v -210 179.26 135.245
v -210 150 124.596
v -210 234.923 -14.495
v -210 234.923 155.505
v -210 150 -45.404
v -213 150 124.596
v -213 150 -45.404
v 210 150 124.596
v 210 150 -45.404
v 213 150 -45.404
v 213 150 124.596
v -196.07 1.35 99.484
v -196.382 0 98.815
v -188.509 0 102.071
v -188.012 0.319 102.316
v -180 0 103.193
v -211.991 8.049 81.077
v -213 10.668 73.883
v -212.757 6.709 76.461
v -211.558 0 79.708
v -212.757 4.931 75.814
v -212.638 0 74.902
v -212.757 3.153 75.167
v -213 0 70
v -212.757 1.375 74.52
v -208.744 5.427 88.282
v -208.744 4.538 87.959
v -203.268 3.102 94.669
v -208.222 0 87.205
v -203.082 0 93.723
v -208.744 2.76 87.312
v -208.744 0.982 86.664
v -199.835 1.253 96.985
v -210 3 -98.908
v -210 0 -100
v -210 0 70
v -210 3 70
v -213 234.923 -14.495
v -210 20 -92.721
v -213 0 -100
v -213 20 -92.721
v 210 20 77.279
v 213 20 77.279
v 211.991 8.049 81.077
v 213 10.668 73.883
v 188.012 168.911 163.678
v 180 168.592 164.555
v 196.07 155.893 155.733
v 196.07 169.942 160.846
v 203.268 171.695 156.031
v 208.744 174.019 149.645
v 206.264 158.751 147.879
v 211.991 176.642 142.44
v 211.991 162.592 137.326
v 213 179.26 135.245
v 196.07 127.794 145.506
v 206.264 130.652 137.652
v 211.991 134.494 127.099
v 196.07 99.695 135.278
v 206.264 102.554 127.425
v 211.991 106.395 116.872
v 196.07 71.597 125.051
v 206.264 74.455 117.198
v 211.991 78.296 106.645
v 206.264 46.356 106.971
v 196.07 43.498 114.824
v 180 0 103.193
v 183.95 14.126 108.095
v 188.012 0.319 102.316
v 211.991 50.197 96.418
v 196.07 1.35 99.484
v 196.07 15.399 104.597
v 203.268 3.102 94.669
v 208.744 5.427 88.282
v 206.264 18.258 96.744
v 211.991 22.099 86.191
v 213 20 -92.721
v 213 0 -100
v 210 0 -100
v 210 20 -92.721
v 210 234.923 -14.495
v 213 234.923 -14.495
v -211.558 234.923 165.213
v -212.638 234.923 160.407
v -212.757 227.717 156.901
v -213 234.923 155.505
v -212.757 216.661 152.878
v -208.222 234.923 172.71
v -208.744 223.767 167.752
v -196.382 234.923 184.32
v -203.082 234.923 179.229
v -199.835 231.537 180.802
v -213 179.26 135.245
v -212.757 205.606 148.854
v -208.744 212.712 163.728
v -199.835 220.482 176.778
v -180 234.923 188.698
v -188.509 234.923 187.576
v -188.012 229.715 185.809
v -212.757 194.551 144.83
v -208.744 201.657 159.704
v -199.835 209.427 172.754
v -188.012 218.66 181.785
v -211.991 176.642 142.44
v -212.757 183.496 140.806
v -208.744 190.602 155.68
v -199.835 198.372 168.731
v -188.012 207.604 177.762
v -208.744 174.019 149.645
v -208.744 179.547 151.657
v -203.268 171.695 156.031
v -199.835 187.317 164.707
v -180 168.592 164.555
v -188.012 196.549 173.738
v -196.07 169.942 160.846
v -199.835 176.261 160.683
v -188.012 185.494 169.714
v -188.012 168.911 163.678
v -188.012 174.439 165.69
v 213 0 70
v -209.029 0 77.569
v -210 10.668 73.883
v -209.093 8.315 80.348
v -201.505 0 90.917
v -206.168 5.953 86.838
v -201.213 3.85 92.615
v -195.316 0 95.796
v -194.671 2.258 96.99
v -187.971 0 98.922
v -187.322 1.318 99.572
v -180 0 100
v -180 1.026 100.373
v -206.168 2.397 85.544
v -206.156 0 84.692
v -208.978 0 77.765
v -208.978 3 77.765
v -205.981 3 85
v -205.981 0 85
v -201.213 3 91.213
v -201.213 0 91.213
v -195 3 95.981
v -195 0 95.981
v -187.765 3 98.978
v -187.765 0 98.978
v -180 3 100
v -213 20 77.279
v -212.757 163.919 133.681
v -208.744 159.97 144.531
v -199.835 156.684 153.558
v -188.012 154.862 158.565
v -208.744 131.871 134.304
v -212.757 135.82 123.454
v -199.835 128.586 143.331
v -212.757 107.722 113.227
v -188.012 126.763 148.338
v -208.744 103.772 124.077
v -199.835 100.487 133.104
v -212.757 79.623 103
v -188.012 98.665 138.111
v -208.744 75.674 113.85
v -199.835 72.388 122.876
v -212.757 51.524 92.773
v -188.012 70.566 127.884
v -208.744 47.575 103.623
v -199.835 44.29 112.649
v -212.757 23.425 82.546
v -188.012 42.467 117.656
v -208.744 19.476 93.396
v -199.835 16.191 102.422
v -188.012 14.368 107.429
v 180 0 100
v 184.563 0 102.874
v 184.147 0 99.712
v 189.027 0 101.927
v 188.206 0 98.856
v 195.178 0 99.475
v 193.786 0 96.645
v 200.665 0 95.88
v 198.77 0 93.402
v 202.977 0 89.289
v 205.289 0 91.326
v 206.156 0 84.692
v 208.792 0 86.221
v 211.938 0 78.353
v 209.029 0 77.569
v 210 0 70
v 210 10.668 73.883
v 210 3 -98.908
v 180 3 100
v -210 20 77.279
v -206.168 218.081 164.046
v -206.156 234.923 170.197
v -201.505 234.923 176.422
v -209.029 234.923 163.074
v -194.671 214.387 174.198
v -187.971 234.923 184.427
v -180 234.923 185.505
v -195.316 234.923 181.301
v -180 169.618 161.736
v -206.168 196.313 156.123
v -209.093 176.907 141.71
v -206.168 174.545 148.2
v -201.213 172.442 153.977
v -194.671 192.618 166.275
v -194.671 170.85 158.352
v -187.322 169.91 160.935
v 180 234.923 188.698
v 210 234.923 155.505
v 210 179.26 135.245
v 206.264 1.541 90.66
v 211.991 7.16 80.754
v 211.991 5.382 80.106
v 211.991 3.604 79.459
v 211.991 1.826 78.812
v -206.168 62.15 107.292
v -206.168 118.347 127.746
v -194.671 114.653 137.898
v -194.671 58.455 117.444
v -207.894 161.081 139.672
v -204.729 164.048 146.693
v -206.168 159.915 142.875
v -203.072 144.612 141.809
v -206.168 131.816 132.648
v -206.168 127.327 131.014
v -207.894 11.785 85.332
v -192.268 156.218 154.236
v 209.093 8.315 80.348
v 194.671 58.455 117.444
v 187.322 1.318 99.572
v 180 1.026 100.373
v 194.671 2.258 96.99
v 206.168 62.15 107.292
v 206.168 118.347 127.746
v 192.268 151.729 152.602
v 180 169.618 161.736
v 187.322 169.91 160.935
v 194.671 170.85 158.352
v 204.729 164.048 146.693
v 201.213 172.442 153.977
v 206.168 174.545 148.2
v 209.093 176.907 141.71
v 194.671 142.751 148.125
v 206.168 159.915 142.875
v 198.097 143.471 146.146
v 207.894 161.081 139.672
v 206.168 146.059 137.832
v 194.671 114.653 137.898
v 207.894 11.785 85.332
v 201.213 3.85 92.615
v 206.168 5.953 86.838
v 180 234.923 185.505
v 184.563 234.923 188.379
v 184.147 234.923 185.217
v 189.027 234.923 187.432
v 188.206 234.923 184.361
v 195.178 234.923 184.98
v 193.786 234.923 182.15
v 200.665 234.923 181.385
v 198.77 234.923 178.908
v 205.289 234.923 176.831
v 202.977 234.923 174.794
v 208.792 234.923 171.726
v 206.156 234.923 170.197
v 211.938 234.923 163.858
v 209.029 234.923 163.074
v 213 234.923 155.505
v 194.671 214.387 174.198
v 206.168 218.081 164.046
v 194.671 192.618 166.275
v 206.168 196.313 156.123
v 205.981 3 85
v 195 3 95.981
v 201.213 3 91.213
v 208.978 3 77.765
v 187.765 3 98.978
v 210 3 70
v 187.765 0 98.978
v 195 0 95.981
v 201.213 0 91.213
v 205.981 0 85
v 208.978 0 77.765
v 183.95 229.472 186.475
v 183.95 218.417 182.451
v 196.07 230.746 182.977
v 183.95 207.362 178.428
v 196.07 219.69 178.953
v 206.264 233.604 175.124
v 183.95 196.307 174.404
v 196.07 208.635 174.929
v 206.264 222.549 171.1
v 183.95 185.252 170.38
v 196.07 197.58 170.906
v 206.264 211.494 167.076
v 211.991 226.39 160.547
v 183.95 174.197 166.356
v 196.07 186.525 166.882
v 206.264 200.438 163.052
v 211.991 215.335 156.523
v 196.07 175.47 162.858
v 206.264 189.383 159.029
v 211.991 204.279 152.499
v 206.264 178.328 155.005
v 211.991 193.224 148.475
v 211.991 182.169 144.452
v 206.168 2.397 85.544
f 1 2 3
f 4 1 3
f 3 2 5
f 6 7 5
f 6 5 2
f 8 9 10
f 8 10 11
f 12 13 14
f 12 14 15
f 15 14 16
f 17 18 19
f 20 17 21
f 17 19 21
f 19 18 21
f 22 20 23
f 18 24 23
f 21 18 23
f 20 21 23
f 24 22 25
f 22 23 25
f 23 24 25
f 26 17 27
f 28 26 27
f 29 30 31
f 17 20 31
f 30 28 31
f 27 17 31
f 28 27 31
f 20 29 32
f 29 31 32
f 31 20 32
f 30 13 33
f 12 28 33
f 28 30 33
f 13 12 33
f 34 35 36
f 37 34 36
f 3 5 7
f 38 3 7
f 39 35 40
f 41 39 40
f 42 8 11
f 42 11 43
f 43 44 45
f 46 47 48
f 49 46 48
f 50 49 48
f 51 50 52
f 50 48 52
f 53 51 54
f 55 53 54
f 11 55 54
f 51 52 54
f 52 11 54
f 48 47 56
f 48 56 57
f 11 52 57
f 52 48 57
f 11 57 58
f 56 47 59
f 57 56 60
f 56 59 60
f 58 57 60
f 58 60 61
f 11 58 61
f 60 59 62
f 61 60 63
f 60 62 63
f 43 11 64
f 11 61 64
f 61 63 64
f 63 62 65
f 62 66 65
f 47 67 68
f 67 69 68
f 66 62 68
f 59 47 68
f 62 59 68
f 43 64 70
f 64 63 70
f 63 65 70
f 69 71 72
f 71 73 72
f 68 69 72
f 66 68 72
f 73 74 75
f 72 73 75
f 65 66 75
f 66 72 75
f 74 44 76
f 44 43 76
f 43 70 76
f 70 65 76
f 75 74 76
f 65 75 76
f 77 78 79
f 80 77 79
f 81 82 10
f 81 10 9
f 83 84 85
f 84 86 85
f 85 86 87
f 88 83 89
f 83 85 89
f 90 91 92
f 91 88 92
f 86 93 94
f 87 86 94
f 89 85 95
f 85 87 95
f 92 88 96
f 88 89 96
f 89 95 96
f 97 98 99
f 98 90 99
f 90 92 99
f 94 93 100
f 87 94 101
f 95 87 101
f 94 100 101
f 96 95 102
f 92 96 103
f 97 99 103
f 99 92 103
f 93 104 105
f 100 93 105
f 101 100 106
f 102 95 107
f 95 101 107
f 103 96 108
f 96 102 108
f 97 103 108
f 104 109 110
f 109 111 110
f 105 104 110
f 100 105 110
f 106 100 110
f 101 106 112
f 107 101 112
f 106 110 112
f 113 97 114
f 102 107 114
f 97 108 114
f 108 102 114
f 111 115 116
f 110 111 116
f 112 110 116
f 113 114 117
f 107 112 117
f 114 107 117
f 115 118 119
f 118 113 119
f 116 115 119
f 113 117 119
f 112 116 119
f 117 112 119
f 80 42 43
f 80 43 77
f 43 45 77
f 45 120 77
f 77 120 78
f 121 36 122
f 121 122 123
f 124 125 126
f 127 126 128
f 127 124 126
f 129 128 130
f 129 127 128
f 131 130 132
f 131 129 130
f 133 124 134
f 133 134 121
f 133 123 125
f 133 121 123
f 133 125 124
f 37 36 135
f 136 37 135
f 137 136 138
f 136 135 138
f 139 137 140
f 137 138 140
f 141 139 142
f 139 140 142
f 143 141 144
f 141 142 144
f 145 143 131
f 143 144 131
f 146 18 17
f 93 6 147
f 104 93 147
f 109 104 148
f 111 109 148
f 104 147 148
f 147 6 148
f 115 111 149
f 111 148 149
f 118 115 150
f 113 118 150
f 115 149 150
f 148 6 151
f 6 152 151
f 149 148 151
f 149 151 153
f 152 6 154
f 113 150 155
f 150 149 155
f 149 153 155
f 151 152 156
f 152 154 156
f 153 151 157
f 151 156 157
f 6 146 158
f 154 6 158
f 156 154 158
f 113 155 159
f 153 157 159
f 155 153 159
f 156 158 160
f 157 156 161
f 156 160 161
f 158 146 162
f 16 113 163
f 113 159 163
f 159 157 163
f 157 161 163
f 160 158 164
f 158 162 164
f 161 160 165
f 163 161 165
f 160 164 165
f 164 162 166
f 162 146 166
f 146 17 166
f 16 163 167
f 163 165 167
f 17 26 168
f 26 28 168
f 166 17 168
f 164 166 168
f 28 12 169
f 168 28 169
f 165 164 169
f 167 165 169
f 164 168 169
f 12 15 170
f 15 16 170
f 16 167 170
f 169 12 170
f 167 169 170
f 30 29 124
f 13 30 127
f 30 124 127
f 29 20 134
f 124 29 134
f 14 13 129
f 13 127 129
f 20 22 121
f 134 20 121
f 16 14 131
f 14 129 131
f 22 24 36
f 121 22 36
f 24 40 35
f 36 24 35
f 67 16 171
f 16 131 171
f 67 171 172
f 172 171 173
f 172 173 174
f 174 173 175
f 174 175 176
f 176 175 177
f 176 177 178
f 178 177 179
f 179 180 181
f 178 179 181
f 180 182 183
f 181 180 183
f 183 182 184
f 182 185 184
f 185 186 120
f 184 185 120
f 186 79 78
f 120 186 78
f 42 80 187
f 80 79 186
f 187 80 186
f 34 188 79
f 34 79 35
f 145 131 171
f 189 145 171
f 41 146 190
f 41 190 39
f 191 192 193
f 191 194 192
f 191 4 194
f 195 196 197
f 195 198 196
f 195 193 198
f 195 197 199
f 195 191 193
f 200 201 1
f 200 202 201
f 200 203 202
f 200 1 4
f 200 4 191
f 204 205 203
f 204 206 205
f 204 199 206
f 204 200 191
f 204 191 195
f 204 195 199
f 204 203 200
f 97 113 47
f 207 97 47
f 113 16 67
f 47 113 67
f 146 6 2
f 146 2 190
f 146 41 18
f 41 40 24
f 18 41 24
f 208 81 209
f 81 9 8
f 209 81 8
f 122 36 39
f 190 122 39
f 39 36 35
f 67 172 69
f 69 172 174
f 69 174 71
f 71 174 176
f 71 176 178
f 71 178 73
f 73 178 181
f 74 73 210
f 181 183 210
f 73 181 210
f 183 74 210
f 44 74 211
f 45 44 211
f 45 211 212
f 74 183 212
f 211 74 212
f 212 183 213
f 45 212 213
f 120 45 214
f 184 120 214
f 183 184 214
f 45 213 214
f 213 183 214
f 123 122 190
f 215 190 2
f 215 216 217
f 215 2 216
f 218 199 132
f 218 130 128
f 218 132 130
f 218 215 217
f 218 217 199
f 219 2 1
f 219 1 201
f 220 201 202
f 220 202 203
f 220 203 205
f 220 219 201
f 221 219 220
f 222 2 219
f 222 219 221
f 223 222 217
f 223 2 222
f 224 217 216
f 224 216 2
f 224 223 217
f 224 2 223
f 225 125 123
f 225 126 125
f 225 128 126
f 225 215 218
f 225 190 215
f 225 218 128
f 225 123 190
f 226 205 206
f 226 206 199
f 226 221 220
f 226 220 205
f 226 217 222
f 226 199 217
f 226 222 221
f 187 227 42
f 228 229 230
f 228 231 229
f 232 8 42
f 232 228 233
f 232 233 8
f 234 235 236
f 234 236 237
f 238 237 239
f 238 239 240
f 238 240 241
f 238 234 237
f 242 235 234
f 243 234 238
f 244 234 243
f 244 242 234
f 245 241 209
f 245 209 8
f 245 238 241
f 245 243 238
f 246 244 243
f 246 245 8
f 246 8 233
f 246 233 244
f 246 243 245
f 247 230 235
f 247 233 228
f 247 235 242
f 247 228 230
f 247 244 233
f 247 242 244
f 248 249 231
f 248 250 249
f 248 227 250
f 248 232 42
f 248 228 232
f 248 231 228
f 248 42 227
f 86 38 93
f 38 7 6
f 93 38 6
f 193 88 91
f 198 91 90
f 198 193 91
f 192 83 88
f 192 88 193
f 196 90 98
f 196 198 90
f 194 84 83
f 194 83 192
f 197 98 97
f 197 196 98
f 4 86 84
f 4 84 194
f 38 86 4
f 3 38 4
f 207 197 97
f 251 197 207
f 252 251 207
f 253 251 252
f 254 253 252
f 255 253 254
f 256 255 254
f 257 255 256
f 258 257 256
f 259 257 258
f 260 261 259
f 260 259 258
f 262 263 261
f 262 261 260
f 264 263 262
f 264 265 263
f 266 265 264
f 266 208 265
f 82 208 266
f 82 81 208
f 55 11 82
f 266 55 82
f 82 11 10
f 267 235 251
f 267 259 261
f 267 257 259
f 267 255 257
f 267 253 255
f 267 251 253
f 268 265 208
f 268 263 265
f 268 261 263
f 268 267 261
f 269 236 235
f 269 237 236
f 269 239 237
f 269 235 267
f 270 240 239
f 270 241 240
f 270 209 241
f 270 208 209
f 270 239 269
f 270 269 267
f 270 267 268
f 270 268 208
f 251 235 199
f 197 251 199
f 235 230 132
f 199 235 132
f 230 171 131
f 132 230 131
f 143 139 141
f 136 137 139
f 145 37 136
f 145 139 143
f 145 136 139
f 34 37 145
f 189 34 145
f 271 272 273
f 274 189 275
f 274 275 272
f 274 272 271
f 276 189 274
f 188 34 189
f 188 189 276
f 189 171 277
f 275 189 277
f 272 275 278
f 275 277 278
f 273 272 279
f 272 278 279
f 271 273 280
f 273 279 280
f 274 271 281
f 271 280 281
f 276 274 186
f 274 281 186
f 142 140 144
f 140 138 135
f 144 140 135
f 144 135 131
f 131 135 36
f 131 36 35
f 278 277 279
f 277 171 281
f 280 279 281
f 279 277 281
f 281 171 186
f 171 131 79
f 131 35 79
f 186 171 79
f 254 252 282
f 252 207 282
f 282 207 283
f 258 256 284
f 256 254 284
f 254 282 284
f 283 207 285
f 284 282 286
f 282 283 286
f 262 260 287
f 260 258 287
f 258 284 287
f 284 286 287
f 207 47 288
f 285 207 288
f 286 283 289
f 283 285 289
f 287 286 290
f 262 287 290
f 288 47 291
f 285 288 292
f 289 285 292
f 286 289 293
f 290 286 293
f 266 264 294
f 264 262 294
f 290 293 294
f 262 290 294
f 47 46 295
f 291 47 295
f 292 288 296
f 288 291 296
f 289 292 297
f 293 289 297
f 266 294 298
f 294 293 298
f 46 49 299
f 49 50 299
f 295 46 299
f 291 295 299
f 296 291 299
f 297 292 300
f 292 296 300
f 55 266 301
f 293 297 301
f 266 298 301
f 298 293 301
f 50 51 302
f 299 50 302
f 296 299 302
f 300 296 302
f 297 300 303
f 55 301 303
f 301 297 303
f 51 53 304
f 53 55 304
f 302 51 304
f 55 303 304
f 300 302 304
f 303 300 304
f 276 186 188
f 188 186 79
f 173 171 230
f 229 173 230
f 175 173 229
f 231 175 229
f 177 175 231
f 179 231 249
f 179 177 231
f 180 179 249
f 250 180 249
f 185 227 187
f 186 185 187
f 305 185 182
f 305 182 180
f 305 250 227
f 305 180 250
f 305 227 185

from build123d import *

# Parameters (mm, degrees)
SWEEP_THIN1_START       = 35.293924935
SWEEP_THIN1_DEPTH       = 179.41214993
SWEEP_THIN1_START_2     = -35.293925135
SWEEP_THIN1_2_DEPTH     = 320.58785027
SWEEP_THIN1_START_3     = -67
SWEEP_THIN1_3_OUTLINE_W = 426
SWEEP_THIN1_3_OUTLINE_H = 295
SWEEP_THIN1_3_DEPTH     = 67
SWEEP_THIN1_START_4     = 234.923155196
SWEEP_THIN1_4_OUTLINE_W = 426
SWEEP_THIN1_4_OUTLINE_H = 295
SWEEP_THIN1_4_DEPTH     = 66.330881923
BOSS_EXTRUDE2_DEPTH     = 3
SKETCH6_W               = 723.00386444
SKETCH6_H               = 605.053805232
CUT_EXTRUDE1_DEPTH      = 3
CUT_EXTRUDE2_DEPTH      = 522.796571163


with BuildPart() as part:
    # Sweep-Thin1: read off the stored shape, not the designer's step
    # Sweep-Thin1 outline → Sweep-Thin1 (new body)
    with BuildSketch(Plane(origin=(0, 0, 0), x_dir=(1, 0, 0), z_dir=(0, 0.9396926207859089, 0.3420201433256673)).offset(SWEEP_THIN1_START)):
        with BuildLine():
            Line((213, -65.778483455), (213, 96.969262079))
            Line((213, 96.969262079), (-213, 96.969262079))
            Line((-213, 96.969262079), (-213, -65.778483455))
            add(Edge.make_bspline(
                [(-213, -65.778483455), (-213, -69.477042237), (-212.493972968, -73.37256542), (-211.393047263, -77.378729206), (-209.625765414, -81.371277703), (-207.160966169, -85.187590547), (-204.030117008, -88.644891062), (-200.35485162, -91.564481232), (-196.328004584, -93.851338413), (-192.135894004, -95.485342048), (-187.941508955, -96.501990369), (-183.867765418, -96.969262079), (-180, -96.969262079)],
                knots=[0, 0, 0, 0, 0, 0, 0, 0, 0, 0, 0, 0, 0, 1, 1, 1, 1, 1, 1, 1, 1, 1, 1, 1, 1, 1], degree=12))
            Line((-180, -96.969262079), (180, -96.969262079))
            add(Edge.make_bspline(
                [(180, -96.969262079), (183.867765418, -96.969262079), (187.941508955, -96.501990369), (192.135894005, -95.485342048), (196.328004584, -93.851338413), (200.35485162, -91.564481232), (204.030117008, -88.644891062), (207.16096617, -85.187590547), (209.625765413, -81.371277703), (211.393047263, -77.378729206), (212.493972968, -73.37256542), (213, -69.477042237), (213, -65.778483455)],
                knots=[0, 0, 0, 0, 0, 0, 0, 0, 0, 0, 0, 0, 0, 1, 1, 1, 1, 1, 1, 1, 1, 1, 1, 1, 1, 1], degree=12))
        make_face()
        with BuildLine():
            Line((-210, 93.969262079), (210, 93.969262079))
            Line((210, 93.969262079), (210, -65.778483455))
            add(Edge.make_bspline(
                [(180, -93.969262079), (197.573593129, -93.969262079), (210, -82.292259239), (210, -65.778483455)],
                knots=[0, 0, 0, 0, 1, 1, 1, 1], degree=3, weights=[1, 0.804737854, 0.804737854, 1]))
            Line((180, -93.969262079), (-180, -93.969262079))
            add(Edge.make_bspline(
                [(-210, -65.778483455), (-210, -82.292259239), (-197.573593129, -93.969262079), (-180, -93.969262079)],
                knots=[0, 0, 0, 0, 1, 1, 1, 1], degree=3, weights=[1, 0.804737854, 0.804737854, 1]))
            Line((-210, -65.778483455), (-210, 93.969262079))
        make_face(mode=Mode.SUBTRACT)
    extrude(amount=SWEEP_THIN1_DEPTH)

    # Sweep-Thin1 2 outline → Sweep-Thin1 2 (add)
    with BuildSketch(Plane(origin=(0, 0, 0), x_dir=(1, 0, 0), z_dir=(0, 0.9396926207859089, 0.3420201433256673)).offset(SWEEP_THIN1_START_2)):
        with BuildLine():
            Line((-213, 96.969262079), (-213, -65.778483455))
            add(Edge.make_bspline(
                [(-213, -65.778483455), (-213, -69.477042237), (-212.493972968, -73.37256542), (-211.393047263, -77.378729206), (-209.625765414, -81.371277703), (-207.160966169, -85.187590547), (-204.030117008, -88.644891062), (-200.35485162, -91.564481232), (-196.328004584, -93.851338413), (-192.135894004, -95.485342048), (-187.941508955, -96.501990369), (-183.867765418, -96.969262079), (-180, -96.969262079)],
                knots=[0, 0, 0, 0, 0, 0, 0, 0, 0, 0, 0, 0, 0, 1, 1, 1, 1, 1, 1, 1, 1, 1, 1, 1, 1, 1], degree=12))
            Line((-180, -96.969262079), (180, -96.969262079))
            add(Edge.make_bspline(
                [(180, -96.969262079), (183.867765418, -96.969262079), (187.941508955, -96.501990369), (192.135894005, -95.485342048), (196.328004584, -93.851338413), (200.35485162, -91.564481232), (204.030117008, -88.644891062), (207.16096617, -85.187590547), (209.625765413, -81.371277703), (211.393047263, -77.378729206), (212.493972968, -73.37256542), (213, -69.477042237), (213, -65.778483455)],
                knots=[0, 0, 0, 0, 0, 0, 0, 0, 0, 0, 0, 0, 0, 1, 1, 1, 1, 1, 1, 1, 1, 1, 1, 1, 1, 1], degree=12))
            Line((213, -65.778483455), (213, 96.969262079))
            Line((213, 96.969262079), (-213, 96.969262079))
        make_face()
        with BuildLine():
            add(Edge.make_bspline(
                [(-210, -65.778483455), (-210, -82.292259239), (-197.573593129, -93.969262079), (-180, -93.969262079)],
                knots=[0, 0, 0, 0, 1, 1, 1, 1], degree=3, weights=[1, 0.804737854, 0.804737854, 1]))
            Line((-210, -65.778483455), (-210, 93.969262079))
            Line((-210, 93.969262079), (210, 93.969262079))
            Line((210, 93.969262079), (210, -65.778483455))
            add(Edge.make_bspline(
                [(180, -93.969262079), (197.573593129, -93.969262079), (210, -82.292259239), (210, -65.778483455)],
                knots=[0, 0, 0, 0, 1, 1, 1, 1], degree=3, weights=[1, 0.804737854, 0.804737854, 1]))
            Line((180, -93.969262079), (-180, -93.969262079))
        make_face(mode=Mode.SUBTRACT)
    extrude(amount=SWEEP_THIN1_2_DEPTH)

    # Sweep-Thin1 3 outline → Sweep-Thin1 3 (cut)
    with BuildSketch(Plane(origin=(0, 0, 0), x_dir=(1, 0, 0), z_dir=(0, 1, 0)).offset(SWEEP_THIN1_START_3)):
        with Locations((0, -42.5)):
            Rectangle(SWEEP_THIN1_3_OUTLINE_W, SWEEP_THIN1_3_OUTLINE_H)
    extrude(amount=SWEEP_THIN1_3_DEPTH, mode=Mode.SUBTRACT)

    # Sweep-Thin1 4 outline → Sweep-Thin1 4 (cut)
    with BuildSketch(Plane(origin=(0, 0, 0), x_dir=(1, 0, 0), z_dir=(0, 1, 0)).offset(SWEEP_THIN1_START_4)):
        with Locations((0, -42.5)):
            Rectangle(SWEEP_THIN1_4_OUTLINE_W, SWEEP_THIN1_4_OUTLINE_H)
    extrude(amount=SWEEP_THIN1_4_DEPTH, mode=Mode.SUBTRACT)


with BuildPart() as body_2:
    # Sketch5 → Boss-Extrude2 (new body)
    with BuildSketch(Plane(origin=(0, 0, 0), x_dir=(1, 0, 0), z_dir=(0, 1, 0))):
        with BuildLine():
            Line((-180, -100), (180, -100))
            ThreePointArc((180, -100), (201.213203436, -91.213203436), (210, -70))
            Line((210, -70), (210, 100))
            Line((210, 100), (-210, 100))
            Line((-210, 100), (-210, -70))
            ThreePointArc((-210, -70), (-201.213203436, -91.213203436), (-180, -100))
        make_face()
    extrude(amount=BOSS_EXTRUDE2_DEPTH)


with BuildPart() as cut_extrude1_tool:
    # Sketch6 → Cut-Extrude1 (new body)
    with BuildSketch(Plane(origin=(0, 33.165440914, -91.121300018), x_dir=(-1, 0, 0), z_dir=(0, 0.34202014332566627, -0.9396926207859093))):
        Rectangle(SKETCH6_W, SKETCH6_H)
    extrude(amount=-CUT_EXTRUDE1_DEPTH)


with BuildPart() as part_1:
    add(part.part)

    # Cut-Extrude1: cut by cut_extrude1_tool
    add(cut_extrude1_tool.part, mode=Mode.SUBTRACT)

    # Sketch7 → Cut-Extrude2 (cut, through all)
    with BuildSketch(Plane.ZY.offset(213)):
        Polygon((-45.40446486, 150), (124.59553514, 150), (77.279404685, 20), (-92.720595315, 20), align=None)
    extrude(amount=-CUT_EXTRUDE2_DEPTH, mode=Mode.SUBTRACT)


with BuildPart() as body_2_1:
    add(body_2.part)

    # Cut-Extrude1: cut by cut_extrude1_tool
    add(cut_extrude1_tool.part, mode=Mode.SUBTRACT)


solid = Compound([part_1.part, body_2_1.part])
